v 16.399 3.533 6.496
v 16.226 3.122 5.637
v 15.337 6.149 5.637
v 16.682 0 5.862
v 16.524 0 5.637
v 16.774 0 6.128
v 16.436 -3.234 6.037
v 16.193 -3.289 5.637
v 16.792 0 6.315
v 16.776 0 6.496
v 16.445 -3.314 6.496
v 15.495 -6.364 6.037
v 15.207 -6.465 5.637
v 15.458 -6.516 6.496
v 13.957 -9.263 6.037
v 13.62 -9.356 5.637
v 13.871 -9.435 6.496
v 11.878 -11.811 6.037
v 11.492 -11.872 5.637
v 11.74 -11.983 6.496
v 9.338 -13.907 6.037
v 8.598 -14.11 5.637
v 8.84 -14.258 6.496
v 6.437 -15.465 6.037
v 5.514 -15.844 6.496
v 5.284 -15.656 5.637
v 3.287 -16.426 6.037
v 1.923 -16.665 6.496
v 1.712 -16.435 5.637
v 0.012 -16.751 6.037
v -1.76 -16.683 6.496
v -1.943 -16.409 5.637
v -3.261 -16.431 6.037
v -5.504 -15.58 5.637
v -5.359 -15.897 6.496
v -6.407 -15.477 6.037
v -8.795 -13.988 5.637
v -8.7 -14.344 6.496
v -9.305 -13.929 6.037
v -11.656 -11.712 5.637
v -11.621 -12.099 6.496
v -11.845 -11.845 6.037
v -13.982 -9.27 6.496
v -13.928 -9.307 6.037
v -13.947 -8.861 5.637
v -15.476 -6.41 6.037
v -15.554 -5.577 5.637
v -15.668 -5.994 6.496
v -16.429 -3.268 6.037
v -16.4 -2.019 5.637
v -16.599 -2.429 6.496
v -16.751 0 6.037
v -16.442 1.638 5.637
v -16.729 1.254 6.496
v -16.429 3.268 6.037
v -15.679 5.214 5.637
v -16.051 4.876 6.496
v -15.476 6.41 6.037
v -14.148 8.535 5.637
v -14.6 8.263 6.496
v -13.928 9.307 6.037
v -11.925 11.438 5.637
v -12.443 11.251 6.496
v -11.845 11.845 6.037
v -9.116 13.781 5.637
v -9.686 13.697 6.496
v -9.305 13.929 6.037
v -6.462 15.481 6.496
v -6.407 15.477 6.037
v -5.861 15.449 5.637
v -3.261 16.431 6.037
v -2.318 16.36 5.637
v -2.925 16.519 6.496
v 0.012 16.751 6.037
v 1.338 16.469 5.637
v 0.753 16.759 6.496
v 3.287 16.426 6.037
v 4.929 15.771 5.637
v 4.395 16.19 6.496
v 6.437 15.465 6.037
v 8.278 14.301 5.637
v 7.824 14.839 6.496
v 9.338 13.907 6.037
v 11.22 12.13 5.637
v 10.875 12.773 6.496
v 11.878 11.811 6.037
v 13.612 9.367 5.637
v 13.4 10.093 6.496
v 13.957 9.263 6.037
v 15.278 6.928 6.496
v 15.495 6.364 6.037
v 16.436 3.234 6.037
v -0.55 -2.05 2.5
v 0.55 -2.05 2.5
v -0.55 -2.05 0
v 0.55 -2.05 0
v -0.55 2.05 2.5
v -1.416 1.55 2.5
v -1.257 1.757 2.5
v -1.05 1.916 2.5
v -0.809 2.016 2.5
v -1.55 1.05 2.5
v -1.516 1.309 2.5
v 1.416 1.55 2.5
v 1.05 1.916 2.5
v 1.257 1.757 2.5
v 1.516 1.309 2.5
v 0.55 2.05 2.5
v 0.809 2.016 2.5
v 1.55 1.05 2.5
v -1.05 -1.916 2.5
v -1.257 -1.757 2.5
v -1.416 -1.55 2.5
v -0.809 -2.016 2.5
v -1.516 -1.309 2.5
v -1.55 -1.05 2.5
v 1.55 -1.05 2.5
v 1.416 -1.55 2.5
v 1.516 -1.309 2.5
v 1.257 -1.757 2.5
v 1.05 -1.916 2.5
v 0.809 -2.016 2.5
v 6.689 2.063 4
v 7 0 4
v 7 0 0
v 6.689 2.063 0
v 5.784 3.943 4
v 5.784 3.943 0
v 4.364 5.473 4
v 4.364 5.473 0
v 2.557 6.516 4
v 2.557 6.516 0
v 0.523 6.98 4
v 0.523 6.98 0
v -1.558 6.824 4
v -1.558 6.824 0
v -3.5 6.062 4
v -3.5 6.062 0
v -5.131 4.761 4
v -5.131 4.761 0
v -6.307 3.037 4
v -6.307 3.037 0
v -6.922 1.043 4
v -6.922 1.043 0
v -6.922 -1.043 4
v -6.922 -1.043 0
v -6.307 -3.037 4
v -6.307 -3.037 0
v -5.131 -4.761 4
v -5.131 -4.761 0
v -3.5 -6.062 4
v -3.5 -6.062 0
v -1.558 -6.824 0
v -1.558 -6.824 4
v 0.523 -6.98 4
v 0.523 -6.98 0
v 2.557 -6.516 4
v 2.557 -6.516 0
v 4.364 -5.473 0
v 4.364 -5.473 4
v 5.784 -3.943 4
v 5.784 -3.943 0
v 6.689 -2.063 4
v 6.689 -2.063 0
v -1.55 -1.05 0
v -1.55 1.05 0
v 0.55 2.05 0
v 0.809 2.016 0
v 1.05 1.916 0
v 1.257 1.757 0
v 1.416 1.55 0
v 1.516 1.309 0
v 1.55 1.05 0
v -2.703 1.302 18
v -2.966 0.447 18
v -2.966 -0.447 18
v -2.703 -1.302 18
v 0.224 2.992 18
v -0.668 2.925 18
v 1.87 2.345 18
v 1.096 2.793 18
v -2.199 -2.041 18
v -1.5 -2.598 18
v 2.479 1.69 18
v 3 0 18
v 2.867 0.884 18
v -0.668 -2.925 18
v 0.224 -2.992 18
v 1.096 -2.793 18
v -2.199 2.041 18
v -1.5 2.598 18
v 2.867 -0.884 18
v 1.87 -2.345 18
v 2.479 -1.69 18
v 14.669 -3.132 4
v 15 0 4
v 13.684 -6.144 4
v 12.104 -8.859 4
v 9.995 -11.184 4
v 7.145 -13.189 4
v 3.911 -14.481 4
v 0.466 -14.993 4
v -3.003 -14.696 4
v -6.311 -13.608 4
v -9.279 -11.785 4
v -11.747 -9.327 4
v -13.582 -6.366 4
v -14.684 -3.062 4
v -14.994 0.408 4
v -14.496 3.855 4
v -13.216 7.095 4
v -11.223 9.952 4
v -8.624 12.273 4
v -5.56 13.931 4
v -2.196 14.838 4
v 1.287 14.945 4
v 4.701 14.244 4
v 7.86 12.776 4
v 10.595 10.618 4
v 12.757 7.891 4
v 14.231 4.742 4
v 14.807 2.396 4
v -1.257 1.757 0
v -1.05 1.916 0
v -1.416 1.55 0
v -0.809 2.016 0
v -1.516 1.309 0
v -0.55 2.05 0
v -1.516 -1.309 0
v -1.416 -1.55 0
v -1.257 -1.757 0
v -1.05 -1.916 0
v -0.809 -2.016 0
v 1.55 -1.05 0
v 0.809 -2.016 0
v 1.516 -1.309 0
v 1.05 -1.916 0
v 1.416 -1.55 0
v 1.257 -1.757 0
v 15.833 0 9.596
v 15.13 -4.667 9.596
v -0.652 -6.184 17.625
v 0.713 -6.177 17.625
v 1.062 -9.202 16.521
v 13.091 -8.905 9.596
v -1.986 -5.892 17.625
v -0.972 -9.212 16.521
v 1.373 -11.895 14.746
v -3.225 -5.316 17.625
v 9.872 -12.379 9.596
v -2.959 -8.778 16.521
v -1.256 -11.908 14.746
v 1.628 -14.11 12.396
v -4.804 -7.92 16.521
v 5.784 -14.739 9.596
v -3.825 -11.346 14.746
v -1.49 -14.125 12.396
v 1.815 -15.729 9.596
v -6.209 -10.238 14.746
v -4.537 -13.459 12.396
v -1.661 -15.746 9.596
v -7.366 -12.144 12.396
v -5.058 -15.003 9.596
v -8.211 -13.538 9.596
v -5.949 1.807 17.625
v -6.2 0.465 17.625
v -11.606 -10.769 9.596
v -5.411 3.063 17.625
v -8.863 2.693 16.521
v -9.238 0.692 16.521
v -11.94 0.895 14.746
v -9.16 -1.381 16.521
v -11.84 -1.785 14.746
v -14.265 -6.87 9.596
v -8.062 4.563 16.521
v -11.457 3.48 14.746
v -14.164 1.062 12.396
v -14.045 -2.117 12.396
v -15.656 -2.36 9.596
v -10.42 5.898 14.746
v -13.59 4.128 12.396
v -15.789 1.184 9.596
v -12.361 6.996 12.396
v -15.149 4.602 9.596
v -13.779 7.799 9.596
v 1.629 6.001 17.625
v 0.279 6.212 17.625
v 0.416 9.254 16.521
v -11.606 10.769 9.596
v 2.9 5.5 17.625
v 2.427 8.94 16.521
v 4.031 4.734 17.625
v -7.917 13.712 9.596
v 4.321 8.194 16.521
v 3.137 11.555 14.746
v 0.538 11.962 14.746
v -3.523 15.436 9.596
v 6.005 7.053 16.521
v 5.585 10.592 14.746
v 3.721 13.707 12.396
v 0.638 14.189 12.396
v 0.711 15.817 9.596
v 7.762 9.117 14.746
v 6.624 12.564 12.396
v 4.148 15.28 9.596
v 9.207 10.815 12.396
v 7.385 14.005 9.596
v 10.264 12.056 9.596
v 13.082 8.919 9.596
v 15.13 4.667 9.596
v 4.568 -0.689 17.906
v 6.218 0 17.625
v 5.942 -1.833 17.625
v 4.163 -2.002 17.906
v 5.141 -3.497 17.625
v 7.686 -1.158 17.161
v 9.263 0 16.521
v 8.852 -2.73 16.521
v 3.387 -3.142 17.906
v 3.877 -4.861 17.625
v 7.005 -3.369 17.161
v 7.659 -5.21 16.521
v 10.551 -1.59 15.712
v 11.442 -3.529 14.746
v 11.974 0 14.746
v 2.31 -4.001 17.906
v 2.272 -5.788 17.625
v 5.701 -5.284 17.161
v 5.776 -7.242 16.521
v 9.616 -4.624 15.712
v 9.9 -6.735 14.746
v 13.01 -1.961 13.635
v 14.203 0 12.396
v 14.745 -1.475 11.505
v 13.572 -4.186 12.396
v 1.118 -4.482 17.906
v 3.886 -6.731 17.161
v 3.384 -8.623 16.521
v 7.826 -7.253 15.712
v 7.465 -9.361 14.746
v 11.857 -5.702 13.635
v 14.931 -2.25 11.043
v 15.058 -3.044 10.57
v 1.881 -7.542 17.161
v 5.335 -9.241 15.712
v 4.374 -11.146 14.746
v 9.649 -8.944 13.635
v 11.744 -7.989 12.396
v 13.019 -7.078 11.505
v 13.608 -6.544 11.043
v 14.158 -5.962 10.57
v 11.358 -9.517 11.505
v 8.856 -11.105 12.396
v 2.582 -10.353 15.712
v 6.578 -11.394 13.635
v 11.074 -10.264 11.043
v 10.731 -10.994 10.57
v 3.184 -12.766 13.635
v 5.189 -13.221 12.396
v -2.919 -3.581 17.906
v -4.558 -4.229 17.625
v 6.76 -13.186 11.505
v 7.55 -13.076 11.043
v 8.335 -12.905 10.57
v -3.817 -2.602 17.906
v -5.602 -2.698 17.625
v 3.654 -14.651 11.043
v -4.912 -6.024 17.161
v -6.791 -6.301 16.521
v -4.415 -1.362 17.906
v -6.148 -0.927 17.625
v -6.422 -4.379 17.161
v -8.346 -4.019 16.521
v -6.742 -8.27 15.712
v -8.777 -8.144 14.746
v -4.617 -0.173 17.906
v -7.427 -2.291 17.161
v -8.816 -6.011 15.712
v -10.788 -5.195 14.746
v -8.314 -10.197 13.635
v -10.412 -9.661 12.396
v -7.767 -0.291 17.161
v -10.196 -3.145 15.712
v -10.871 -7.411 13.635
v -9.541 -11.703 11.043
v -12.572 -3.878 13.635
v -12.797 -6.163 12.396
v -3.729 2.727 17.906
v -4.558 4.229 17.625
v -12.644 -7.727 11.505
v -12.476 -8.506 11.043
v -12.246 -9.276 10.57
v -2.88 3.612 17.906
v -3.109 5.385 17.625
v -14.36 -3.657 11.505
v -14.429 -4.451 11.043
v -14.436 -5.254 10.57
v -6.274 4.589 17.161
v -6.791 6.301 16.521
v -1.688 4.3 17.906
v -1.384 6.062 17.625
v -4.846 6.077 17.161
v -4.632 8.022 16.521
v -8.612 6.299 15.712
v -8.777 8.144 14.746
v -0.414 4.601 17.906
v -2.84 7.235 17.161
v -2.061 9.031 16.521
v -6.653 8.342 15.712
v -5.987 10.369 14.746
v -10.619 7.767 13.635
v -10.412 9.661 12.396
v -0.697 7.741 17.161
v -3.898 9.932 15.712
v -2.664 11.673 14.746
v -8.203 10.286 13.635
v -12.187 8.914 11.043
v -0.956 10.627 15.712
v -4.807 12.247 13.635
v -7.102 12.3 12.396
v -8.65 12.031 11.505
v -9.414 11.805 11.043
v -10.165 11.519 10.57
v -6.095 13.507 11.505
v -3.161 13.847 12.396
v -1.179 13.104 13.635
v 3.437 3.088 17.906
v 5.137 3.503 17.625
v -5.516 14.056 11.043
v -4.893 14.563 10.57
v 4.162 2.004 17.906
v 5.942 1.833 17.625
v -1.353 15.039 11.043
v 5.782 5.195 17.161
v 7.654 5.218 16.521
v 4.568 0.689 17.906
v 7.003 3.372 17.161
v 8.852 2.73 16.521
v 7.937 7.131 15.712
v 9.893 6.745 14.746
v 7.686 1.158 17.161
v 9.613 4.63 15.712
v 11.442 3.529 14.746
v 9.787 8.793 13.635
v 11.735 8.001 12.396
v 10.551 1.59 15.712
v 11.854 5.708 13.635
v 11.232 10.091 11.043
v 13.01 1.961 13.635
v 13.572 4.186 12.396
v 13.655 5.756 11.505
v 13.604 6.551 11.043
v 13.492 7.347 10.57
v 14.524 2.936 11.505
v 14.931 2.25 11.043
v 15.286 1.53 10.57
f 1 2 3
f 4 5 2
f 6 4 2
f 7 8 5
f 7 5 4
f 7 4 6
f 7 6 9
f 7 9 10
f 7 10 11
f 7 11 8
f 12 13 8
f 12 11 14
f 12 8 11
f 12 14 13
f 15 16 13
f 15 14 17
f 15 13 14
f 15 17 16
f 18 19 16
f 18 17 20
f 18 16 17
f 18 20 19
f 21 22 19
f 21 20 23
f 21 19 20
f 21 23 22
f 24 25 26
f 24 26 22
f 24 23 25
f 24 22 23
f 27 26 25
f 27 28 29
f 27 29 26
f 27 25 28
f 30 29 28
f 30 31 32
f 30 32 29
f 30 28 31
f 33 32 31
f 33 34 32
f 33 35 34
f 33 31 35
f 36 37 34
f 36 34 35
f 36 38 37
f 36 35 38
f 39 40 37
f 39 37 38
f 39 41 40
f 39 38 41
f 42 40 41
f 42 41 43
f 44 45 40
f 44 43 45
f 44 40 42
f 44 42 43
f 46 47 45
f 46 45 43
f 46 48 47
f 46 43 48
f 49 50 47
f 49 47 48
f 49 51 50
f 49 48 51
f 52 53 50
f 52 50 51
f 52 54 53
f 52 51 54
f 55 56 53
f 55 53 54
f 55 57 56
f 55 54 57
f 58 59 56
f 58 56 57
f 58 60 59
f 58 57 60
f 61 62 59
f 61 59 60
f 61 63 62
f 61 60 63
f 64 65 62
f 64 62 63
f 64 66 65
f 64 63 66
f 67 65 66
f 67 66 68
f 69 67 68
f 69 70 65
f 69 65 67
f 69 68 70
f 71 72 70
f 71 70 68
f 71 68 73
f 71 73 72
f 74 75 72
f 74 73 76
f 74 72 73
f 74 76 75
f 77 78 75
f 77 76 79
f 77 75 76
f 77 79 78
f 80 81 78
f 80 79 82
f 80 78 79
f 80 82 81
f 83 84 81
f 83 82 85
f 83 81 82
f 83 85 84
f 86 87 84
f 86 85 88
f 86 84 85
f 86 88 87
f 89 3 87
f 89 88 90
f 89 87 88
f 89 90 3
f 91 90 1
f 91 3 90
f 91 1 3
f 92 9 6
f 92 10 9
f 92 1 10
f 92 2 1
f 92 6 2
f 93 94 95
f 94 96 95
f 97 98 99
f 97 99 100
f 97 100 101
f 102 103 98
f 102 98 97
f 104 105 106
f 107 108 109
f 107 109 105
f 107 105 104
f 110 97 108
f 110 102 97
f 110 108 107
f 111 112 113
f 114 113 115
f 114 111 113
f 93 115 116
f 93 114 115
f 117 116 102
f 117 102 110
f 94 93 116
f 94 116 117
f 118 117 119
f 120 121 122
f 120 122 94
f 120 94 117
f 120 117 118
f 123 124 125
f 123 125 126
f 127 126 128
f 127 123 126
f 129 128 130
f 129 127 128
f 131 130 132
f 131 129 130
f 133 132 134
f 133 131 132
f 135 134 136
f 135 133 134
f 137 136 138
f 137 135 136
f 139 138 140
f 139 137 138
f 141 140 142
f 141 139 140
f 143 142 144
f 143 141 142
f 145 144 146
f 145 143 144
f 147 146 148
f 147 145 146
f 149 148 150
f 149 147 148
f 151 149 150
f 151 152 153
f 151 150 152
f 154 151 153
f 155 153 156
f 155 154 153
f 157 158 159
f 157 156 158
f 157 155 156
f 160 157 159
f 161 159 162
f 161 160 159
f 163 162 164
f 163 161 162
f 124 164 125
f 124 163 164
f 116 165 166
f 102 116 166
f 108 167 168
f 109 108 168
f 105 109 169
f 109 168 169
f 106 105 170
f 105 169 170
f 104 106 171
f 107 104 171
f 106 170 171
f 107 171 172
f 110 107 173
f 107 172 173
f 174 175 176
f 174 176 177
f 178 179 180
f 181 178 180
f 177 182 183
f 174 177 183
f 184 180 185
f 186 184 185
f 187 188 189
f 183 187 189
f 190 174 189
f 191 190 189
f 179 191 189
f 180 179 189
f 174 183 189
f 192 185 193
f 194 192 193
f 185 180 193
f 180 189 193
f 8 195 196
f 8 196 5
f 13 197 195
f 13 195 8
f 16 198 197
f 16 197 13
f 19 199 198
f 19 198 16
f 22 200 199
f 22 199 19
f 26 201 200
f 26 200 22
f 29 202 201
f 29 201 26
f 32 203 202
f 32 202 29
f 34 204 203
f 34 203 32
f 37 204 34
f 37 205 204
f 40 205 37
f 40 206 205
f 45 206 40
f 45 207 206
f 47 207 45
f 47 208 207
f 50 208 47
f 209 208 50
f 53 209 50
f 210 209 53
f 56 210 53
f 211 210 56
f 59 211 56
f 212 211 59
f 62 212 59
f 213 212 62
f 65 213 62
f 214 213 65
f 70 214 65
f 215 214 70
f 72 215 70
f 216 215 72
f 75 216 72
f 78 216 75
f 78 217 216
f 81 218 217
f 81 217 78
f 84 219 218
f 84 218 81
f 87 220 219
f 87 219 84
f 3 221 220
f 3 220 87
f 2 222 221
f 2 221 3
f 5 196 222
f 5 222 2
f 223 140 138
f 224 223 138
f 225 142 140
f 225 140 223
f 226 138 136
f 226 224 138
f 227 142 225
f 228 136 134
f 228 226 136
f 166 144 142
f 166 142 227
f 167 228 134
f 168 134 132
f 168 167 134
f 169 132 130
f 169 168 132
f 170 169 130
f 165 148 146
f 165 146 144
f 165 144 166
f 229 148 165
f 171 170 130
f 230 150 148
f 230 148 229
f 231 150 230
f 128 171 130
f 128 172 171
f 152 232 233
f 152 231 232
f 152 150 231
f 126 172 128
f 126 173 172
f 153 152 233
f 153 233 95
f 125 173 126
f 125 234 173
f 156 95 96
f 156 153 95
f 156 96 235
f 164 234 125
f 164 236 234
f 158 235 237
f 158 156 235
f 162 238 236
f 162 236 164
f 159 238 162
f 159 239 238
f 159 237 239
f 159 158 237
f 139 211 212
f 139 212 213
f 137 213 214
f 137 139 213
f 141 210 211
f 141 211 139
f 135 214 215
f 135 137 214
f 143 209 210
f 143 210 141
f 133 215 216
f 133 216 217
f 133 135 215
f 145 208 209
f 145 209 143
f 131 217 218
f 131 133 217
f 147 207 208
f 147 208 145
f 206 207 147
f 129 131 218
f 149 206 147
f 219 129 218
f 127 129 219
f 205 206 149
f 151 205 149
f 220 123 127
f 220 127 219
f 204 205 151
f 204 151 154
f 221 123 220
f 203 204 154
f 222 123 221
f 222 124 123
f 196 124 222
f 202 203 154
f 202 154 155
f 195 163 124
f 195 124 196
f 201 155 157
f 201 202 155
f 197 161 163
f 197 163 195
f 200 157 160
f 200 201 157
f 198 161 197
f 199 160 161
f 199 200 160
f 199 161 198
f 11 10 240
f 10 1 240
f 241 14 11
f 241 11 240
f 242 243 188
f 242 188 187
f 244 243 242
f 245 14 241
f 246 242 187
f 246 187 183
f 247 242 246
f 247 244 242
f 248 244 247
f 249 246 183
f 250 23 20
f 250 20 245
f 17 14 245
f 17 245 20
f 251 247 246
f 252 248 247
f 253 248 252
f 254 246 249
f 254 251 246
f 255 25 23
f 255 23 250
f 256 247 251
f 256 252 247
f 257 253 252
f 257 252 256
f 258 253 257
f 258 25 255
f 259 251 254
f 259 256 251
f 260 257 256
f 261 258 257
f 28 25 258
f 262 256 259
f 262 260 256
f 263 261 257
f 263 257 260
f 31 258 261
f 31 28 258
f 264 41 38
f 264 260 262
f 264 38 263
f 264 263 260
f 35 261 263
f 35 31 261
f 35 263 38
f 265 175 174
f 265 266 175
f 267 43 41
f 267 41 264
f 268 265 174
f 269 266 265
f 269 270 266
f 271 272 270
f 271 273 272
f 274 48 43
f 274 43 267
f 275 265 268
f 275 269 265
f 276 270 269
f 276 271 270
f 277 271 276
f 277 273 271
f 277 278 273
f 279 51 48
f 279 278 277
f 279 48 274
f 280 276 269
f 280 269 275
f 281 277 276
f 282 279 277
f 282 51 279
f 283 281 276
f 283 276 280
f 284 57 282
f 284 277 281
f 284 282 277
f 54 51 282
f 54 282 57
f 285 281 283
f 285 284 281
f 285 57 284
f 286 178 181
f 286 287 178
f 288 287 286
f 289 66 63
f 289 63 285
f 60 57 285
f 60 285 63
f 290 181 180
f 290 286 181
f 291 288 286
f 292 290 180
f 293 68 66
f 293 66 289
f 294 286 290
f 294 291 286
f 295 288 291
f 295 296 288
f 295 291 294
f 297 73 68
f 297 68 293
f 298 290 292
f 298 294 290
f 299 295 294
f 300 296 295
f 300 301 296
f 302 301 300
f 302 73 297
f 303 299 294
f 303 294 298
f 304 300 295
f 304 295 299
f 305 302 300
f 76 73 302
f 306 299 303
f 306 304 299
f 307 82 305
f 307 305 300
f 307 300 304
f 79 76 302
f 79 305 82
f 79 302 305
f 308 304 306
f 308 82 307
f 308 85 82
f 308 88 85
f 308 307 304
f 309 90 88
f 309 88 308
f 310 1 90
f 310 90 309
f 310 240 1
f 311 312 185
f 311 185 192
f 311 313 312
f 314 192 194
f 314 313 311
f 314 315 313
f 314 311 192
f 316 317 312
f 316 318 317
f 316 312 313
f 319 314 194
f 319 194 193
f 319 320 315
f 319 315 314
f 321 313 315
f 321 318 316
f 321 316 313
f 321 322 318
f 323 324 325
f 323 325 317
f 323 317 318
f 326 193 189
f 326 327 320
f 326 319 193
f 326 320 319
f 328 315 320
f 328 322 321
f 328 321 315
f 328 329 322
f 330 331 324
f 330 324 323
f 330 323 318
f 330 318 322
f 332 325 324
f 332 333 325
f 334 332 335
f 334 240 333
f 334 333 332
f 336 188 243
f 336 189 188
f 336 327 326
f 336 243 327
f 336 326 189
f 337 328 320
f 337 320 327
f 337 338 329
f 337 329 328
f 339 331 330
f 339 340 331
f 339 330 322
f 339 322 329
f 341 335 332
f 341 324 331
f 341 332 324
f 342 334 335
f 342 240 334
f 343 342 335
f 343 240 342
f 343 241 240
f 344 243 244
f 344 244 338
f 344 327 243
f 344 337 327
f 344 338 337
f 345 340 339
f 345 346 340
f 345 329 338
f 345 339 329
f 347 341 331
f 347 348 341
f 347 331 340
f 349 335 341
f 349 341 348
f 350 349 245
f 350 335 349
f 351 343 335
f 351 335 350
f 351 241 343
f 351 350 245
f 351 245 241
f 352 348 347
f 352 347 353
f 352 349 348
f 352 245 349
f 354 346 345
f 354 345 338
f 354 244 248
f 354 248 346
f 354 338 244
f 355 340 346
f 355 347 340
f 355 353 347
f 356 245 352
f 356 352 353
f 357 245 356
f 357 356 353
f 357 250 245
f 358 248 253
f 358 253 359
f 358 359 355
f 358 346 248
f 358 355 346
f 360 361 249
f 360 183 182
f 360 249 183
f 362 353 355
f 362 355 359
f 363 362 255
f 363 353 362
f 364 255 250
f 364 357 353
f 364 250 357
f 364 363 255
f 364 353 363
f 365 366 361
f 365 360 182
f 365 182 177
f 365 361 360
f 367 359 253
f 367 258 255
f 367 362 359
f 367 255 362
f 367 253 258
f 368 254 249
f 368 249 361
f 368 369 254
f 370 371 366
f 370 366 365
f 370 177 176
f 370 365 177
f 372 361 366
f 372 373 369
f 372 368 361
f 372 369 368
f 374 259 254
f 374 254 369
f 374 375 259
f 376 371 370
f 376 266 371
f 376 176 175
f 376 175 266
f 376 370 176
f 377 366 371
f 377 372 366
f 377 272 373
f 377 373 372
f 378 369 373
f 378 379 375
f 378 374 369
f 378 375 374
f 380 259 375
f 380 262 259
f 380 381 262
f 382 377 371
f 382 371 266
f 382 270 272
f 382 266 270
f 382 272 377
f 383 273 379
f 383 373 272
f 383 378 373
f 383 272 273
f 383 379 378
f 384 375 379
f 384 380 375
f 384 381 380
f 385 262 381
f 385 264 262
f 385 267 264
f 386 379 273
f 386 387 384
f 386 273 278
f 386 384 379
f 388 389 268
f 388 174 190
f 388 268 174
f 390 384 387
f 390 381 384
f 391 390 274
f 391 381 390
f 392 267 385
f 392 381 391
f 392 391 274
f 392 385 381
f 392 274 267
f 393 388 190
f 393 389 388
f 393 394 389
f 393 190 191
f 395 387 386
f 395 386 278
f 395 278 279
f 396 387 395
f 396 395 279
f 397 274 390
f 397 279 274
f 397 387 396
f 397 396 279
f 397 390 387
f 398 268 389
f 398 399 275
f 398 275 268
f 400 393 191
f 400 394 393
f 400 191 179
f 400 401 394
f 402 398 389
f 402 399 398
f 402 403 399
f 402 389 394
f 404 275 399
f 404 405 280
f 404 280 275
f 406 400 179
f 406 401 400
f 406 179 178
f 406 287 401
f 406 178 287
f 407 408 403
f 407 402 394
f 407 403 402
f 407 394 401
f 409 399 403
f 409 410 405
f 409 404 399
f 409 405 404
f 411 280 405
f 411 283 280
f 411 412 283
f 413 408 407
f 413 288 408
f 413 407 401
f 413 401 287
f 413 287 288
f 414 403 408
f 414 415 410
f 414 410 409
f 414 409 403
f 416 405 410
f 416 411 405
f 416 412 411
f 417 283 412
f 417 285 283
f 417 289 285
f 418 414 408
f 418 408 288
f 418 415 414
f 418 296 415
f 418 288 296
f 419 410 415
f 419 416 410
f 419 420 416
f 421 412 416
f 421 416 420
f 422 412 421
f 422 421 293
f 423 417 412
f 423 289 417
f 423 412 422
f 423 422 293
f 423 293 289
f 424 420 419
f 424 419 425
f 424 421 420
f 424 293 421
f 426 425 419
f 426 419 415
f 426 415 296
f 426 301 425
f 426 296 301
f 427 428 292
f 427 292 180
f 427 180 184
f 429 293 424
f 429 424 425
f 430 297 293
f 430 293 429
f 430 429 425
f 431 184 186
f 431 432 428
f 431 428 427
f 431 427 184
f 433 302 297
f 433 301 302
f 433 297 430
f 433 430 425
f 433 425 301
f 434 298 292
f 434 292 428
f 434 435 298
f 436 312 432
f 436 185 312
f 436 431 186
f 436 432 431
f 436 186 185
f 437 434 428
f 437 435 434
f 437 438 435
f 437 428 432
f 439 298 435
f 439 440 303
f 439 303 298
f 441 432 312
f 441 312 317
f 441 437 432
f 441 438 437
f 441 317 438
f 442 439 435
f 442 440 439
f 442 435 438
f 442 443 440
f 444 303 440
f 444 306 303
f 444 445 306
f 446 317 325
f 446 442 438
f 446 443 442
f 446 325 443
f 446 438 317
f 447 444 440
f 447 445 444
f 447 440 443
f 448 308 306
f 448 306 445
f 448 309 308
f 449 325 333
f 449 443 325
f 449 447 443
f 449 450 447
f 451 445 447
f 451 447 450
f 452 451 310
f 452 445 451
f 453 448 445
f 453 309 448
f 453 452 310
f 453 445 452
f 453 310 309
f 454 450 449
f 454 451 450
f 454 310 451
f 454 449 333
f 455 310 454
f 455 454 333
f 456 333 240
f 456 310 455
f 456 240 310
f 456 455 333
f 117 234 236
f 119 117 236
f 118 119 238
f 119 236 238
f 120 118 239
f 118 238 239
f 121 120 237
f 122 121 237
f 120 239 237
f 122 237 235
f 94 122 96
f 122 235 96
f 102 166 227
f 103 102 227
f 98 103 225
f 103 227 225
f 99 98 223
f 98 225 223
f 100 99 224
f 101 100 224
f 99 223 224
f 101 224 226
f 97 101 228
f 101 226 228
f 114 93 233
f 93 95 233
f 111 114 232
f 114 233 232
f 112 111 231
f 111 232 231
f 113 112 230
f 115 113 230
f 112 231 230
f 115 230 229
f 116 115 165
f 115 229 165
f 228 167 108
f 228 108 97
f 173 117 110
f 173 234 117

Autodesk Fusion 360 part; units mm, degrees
sketch "Sketch1" plane through (0, 0, 0) normal (0, 1, 0) x (1, 0, 0)
  line L0 (0, 0) -> (7, 0)
  line L1 (7, 0) -> (7, -4)
  line L2 (7, -4) -> (17, -4)
  line L3 (0, -18) -> (0, 0)
  line L4 (0, -18) -> (3, -18)
  arc A0 (3, -18) -> (17, -4) centre (3, -4) ccw
  dimension "d1" = 7
  dimension "d2" = 4
  dimension "d3" = 10
  dimension "d4" = 3
  dimension "d5" = 18
revolve "Revolve1" add sketch "Sketch1" angle 360 about axis through (0, 0, 18) along (0, 0, -1)
sketch "Sketch2" plane through (0, 0, 0) normal (0, 0, -1) x (1, 0, 0)
  circle A0 centre (0, 0) radius 7
  line L0 (1.55, 1.05) -> (1.55, -1.05)
  line L1 (-1.55, 1.05) -> (-1.55, -1.05)
  line L2 (0.55, -2.05) -> (-0.55, -2.05)
  line L3 (0.55, 2.05) -> (-0.55, 2.05)
  arc A1 (0.55, -2.05) -> (1.55, -1.05) centre (0.55, -1.05) ccw
  arc A2 (-0.55, 2.05) -> (-1.55, 1.05) centre (-0.55, 1.05) ccw
  arc A3 (-1.55, -1.05) -> (-0.55, -2.05) centre (-0.55, -1.05) ccw
  arc A4 (1.55, 1.05) -> (0.55, 2.05) centre (0.55, 1.05) ccw
  point P0 (0, -2.05)
  point P1 (1.55, 2.05)
  point P2 (1.55, -2.05)
  point P3 (1.55, 0)
  point P4 (-1.55, 2.05)
  dimension "d11" = 4.1
  dimension "d12" = 3.1
  dimension "d13" = 1
extrude "Extrude1" cut sketch "Sketch2" against normal blind 2.5 contours L0 L1 L2 L3 A1 A2 A3 A4
chamfer "Chamfer1" distance 2 angle 45 1 edges at (-15.8496, -6.1475, 4)
fillet "Fillet1" radius 1 1 edges at (15.7164, -6.0958, 5.9949)
